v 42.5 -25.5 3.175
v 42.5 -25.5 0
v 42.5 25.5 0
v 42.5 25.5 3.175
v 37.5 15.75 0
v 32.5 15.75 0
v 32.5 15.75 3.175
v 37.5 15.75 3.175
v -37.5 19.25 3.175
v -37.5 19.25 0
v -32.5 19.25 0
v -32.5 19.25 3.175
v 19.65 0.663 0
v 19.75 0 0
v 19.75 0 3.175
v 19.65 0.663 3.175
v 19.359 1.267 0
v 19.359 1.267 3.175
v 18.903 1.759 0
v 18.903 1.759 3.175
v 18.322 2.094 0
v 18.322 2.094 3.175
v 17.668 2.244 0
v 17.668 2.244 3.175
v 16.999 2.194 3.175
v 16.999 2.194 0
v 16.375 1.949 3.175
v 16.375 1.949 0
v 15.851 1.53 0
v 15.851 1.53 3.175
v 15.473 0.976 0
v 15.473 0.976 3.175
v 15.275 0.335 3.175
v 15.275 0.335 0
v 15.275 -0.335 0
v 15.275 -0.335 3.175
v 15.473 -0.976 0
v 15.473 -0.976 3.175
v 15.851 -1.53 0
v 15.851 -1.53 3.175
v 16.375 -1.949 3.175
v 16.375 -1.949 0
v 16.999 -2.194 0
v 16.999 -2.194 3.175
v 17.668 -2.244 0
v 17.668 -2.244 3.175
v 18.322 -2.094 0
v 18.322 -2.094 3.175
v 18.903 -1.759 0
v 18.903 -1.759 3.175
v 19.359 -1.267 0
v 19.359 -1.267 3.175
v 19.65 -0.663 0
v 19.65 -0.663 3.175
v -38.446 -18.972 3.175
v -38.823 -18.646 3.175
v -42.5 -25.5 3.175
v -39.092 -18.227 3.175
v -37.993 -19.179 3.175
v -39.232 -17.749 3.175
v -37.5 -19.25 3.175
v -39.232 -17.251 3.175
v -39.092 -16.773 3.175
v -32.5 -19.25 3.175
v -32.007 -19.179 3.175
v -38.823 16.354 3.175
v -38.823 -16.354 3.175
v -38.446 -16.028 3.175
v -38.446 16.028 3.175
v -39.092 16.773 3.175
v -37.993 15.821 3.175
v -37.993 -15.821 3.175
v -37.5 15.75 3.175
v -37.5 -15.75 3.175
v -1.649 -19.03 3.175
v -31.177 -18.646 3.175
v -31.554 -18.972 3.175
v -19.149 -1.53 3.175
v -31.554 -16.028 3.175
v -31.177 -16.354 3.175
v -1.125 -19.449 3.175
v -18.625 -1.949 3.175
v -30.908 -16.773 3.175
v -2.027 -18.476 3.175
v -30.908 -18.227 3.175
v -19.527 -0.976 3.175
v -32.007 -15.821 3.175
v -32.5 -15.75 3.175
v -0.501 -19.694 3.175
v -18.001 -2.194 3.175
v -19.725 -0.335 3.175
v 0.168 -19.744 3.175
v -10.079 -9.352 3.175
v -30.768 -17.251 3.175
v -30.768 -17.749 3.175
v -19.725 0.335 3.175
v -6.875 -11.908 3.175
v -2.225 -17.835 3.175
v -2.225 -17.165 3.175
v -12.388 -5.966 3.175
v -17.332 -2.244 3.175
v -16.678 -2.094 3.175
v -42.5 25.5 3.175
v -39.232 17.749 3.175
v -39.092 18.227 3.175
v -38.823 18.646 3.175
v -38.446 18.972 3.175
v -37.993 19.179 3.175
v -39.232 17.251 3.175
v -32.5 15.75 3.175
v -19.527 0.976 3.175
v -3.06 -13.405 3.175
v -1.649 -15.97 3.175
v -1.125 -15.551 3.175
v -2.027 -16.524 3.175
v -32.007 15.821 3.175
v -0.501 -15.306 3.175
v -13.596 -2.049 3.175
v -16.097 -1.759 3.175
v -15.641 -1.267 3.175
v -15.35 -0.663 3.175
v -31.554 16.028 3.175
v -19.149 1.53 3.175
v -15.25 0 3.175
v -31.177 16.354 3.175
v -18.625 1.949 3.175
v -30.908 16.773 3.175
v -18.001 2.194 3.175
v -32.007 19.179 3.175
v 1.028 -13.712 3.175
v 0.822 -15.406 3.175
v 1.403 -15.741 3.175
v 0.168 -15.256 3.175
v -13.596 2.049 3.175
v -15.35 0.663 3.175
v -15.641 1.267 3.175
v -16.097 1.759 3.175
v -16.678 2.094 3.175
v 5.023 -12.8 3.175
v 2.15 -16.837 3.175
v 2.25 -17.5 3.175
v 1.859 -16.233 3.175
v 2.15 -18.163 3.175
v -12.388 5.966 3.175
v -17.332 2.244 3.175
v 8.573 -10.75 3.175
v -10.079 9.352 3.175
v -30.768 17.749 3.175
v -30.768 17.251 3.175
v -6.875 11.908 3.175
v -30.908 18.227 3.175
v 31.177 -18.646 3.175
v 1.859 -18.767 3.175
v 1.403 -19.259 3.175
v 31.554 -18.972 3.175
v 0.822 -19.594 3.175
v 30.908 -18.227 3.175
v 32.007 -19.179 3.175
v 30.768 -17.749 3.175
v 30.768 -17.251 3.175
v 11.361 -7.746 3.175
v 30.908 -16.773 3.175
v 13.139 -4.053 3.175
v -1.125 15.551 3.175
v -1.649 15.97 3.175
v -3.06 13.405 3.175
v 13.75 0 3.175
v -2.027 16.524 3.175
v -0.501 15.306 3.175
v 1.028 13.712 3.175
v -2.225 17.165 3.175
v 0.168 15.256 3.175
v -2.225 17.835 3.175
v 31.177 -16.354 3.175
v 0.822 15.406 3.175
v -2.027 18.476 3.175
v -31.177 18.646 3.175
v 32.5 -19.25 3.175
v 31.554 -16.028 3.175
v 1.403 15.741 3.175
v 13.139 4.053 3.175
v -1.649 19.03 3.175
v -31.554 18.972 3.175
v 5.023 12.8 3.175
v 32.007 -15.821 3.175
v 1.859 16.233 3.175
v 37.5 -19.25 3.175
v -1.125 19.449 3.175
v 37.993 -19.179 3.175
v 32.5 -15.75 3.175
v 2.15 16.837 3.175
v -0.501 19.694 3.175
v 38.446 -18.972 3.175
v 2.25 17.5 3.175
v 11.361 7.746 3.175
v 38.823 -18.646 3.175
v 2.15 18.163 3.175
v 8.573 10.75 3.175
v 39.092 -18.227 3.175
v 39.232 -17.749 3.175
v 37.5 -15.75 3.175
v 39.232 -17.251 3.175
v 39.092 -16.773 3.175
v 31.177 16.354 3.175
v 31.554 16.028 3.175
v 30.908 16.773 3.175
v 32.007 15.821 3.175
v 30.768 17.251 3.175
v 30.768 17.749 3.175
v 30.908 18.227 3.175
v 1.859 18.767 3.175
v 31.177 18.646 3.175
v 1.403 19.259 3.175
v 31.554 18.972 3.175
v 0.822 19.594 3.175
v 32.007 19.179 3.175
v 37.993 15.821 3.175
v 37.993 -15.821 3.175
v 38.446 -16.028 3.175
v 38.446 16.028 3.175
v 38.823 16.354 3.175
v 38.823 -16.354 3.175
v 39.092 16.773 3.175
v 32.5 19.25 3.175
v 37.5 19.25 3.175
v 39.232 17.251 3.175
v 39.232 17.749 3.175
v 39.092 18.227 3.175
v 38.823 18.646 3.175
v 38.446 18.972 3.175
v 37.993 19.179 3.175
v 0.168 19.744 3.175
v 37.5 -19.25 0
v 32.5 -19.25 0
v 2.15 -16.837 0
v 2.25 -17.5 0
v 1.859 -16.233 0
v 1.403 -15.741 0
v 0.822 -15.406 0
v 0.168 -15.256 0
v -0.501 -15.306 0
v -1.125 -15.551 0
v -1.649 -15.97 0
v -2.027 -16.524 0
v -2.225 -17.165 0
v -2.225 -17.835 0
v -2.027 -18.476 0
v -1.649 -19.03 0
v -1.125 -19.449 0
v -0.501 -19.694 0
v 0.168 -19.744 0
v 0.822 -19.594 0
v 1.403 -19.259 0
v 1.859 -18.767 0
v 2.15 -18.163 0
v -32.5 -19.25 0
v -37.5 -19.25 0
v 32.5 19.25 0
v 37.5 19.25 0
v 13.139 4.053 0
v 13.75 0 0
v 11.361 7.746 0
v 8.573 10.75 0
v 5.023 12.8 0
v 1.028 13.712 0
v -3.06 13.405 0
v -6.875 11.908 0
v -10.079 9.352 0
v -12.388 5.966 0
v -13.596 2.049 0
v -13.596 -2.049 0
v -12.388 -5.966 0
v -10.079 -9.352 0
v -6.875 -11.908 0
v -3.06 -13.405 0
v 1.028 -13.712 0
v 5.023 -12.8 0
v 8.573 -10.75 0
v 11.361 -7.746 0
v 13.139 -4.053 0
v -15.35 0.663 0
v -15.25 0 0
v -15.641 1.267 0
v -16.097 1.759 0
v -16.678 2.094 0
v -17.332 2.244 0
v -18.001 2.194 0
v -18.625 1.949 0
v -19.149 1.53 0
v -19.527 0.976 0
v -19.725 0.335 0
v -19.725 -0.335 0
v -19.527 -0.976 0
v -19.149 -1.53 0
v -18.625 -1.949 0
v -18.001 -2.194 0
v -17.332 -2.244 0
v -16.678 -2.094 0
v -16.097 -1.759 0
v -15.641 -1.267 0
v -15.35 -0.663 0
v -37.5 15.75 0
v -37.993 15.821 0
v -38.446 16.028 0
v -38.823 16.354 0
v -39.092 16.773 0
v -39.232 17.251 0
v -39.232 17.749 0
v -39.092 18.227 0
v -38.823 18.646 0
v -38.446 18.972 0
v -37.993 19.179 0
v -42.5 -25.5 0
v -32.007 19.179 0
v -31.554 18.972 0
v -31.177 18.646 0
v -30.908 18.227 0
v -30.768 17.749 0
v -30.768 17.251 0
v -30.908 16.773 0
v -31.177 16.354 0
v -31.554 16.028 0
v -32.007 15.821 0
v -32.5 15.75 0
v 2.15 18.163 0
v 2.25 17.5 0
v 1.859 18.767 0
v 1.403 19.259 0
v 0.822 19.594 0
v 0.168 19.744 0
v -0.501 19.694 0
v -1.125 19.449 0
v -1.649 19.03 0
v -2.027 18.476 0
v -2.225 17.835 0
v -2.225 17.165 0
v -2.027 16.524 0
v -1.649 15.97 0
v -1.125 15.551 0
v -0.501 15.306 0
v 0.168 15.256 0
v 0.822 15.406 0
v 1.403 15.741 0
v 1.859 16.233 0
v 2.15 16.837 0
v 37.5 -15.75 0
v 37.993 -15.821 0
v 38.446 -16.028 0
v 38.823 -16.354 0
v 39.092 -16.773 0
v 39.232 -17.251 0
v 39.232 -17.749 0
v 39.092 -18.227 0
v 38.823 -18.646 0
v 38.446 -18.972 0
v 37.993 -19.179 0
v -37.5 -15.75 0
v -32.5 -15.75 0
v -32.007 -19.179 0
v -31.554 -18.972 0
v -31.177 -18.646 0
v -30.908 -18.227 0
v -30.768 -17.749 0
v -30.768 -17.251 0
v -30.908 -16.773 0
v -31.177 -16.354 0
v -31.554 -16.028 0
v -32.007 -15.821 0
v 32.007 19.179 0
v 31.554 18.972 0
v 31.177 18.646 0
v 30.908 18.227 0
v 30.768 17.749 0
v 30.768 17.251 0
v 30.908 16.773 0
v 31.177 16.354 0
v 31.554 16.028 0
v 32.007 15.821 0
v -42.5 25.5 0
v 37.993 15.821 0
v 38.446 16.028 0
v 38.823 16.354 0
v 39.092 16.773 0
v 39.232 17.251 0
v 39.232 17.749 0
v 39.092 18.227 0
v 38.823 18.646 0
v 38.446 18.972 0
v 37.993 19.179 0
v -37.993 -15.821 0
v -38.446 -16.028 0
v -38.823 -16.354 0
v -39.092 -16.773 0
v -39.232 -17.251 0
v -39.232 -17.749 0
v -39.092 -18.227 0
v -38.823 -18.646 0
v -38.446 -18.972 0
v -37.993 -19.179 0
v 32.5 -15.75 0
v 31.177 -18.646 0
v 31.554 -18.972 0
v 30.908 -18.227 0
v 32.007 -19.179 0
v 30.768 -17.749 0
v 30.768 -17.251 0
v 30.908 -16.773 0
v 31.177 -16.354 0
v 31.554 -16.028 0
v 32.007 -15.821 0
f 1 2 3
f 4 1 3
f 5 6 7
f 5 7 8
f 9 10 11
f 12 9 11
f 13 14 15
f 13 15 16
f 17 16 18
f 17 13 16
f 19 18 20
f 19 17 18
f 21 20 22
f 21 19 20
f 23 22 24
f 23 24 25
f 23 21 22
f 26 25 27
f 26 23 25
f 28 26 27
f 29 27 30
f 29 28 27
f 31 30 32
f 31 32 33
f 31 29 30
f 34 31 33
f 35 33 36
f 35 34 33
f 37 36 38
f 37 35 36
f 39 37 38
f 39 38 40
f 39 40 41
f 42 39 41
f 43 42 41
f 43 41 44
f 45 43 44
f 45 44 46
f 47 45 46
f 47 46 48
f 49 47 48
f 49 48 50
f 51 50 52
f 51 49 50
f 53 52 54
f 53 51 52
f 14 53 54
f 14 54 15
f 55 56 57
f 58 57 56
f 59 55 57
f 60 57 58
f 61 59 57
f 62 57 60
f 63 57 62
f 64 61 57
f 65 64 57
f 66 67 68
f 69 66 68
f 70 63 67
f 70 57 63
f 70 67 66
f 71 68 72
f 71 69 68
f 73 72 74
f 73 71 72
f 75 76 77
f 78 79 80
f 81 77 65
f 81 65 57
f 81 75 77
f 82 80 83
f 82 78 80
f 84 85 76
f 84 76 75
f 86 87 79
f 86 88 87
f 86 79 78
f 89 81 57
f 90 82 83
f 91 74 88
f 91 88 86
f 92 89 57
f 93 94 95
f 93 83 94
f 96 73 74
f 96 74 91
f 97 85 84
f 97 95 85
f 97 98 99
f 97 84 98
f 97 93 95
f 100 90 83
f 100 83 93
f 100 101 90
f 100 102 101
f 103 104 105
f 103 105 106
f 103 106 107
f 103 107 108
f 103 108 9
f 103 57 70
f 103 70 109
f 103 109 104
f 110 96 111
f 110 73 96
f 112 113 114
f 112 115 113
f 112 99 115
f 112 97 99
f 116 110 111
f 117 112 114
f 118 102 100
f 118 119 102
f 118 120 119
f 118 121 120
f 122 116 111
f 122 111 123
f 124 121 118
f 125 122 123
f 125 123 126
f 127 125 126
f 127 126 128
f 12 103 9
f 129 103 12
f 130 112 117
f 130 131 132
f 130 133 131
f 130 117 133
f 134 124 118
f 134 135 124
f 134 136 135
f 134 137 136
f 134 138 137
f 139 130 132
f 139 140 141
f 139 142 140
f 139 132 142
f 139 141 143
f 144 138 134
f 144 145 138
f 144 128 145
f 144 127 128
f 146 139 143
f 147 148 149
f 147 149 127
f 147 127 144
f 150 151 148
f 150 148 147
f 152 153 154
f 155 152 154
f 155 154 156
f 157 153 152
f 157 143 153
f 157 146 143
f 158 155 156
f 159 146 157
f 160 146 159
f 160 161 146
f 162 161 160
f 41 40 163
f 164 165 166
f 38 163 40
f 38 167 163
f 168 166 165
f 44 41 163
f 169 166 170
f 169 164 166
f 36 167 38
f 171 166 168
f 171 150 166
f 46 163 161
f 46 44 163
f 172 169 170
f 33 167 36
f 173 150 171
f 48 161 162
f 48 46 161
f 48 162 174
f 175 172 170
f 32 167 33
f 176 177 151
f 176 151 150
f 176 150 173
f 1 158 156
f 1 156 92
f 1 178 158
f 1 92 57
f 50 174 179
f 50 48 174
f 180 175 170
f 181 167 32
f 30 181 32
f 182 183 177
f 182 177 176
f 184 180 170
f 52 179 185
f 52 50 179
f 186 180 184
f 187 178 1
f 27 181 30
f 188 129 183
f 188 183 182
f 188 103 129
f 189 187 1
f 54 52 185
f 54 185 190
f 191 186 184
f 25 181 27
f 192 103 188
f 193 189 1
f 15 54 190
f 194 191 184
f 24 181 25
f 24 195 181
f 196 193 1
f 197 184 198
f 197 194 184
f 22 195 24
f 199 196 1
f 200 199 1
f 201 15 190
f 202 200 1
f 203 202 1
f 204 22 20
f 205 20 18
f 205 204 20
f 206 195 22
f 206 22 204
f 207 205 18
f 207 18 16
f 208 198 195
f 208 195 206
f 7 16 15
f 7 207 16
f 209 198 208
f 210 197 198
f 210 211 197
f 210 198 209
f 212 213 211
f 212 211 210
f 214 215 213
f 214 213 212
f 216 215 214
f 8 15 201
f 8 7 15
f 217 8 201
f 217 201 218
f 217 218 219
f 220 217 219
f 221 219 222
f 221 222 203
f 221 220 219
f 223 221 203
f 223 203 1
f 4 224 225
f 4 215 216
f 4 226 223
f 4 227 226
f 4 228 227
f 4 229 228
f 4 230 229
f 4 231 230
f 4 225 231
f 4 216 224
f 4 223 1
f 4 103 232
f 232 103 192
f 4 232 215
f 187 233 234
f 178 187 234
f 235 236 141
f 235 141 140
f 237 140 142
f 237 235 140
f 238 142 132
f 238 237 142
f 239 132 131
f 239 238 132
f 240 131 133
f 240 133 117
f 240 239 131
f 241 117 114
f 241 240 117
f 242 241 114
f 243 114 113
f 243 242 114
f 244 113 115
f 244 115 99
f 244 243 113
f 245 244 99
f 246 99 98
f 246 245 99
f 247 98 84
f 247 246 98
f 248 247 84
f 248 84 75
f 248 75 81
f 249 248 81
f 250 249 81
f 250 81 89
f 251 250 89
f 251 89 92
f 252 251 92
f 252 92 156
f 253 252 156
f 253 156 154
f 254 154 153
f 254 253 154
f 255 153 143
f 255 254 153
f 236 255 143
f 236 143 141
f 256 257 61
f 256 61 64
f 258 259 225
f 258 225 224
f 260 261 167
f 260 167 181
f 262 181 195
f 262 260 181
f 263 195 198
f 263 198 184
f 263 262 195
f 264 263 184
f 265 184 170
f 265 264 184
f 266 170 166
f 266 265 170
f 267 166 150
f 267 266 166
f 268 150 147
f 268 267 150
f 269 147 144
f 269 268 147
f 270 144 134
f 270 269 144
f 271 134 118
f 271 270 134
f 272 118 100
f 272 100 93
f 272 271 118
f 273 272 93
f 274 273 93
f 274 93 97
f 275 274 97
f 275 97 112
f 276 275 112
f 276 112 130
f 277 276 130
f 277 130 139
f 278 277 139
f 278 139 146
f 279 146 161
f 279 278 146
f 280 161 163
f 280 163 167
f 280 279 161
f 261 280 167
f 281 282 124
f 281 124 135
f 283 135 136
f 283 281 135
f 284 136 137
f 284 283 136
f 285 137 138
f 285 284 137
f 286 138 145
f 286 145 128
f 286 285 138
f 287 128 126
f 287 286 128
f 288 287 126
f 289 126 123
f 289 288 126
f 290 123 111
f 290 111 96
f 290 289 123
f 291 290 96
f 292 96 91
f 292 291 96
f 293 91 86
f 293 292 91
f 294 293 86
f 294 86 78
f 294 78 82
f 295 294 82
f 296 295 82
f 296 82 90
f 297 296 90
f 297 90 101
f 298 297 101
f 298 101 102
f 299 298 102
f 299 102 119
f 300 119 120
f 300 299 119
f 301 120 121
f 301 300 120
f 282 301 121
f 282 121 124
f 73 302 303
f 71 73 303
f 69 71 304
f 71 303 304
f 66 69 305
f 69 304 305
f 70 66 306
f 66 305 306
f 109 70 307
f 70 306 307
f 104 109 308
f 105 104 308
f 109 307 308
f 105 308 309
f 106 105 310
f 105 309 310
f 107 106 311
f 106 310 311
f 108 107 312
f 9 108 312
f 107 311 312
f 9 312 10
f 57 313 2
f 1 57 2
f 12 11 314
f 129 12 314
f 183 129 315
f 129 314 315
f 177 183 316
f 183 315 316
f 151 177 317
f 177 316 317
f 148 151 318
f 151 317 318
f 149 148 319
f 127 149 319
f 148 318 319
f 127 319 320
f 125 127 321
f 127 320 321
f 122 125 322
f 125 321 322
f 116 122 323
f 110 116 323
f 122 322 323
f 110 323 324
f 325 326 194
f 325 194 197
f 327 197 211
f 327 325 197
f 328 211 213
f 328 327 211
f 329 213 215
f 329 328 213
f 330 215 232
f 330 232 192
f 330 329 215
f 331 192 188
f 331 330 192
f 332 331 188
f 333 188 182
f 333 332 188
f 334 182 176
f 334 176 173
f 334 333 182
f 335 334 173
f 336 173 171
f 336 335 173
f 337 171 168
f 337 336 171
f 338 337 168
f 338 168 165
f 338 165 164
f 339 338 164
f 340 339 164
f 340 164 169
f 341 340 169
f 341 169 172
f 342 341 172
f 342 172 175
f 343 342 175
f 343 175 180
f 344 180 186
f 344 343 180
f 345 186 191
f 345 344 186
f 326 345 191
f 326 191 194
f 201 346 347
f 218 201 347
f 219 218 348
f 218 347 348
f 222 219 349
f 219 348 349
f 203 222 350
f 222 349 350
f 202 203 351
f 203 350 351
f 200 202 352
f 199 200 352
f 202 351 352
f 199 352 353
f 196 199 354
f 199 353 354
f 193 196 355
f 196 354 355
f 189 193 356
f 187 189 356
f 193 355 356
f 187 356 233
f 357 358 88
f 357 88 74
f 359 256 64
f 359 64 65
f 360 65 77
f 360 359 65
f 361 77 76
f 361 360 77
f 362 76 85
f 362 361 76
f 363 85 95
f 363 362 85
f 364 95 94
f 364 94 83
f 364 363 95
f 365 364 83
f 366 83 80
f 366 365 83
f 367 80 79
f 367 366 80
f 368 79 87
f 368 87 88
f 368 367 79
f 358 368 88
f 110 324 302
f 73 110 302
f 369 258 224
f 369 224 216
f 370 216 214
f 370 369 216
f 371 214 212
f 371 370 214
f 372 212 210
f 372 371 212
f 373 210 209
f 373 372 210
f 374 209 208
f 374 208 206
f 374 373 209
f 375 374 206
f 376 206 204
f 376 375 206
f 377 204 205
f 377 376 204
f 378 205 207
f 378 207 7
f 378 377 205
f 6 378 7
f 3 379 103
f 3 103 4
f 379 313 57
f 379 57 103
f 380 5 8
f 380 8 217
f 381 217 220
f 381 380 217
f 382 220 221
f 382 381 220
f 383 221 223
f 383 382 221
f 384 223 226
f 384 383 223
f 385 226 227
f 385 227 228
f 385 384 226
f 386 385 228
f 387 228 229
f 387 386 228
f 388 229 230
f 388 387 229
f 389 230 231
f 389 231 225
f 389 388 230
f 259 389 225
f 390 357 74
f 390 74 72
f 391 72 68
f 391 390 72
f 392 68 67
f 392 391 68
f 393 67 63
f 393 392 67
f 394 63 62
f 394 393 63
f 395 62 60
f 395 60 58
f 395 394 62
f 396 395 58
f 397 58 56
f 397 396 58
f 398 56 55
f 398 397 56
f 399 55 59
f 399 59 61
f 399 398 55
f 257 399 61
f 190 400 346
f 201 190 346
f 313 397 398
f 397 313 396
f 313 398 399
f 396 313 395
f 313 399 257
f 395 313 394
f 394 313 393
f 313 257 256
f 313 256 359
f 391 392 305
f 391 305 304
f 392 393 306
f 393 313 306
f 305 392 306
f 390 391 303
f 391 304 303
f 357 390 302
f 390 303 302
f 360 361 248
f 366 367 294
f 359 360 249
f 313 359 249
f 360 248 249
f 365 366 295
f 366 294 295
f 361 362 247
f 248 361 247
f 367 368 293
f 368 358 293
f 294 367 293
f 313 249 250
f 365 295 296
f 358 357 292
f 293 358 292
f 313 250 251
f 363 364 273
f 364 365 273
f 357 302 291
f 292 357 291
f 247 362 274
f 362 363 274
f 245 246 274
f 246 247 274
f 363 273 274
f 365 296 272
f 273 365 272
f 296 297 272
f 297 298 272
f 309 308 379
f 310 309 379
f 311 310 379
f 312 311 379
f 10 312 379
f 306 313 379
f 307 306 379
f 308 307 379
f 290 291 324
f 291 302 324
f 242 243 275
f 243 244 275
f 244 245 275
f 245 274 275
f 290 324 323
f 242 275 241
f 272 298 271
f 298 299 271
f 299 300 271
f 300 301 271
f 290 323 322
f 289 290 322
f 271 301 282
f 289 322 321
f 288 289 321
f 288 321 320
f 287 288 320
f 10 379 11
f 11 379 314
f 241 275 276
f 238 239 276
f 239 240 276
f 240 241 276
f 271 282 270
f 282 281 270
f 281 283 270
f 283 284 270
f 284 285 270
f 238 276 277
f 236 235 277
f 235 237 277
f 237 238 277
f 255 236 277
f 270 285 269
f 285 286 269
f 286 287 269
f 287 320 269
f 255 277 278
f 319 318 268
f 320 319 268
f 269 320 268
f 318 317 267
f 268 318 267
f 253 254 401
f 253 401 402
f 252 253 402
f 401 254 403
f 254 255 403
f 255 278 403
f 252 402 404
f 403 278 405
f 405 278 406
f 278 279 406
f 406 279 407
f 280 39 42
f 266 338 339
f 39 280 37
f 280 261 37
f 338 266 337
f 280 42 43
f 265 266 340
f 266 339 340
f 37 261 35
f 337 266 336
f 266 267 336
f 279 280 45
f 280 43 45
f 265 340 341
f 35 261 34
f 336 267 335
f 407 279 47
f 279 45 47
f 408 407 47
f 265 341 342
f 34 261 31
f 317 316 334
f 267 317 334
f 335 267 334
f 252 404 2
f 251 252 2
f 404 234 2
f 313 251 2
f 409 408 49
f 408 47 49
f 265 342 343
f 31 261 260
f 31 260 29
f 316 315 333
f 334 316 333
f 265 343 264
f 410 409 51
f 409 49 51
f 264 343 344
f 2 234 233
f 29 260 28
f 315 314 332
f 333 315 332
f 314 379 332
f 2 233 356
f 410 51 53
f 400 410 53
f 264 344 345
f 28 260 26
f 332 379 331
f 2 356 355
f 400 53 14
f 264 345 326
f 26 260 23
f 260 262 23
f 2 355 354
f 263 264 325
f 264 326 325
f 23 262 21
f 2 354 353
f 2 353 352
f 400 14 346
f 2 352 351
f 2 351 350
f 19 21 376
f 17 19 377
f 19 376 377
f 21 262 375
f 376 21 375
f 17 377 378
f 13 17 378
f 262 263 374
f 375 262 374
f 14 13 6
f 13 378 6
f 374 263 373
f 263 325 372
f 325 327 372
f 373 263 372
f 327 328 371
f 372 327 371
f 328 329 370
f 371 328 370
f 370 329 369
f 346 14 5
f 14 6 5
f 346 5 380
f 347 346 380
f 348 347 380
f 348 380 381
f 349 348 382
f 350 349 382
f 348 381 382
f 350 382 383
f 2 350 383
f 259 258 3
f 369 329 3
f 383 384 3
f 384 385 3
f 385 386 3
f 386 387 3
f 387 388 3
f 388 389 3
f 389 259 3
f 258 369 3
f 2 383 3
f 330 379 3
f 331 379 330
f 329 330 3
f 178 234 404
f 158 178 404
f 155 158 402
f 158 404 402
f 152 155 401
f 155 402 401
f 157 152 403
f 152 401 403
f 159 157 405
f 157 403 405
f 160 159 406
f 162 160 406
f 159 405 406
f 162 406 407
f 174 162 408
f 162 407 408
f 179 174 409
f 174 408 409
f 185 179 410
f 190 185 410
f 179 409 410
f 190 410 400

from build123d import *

# Parameters (mm, degrees)
SKETCH1_W           = 85
SKETCH1_H           = 51
SKETCH1_R           = 13.75
SKETCH1_R_2         = 2.25
BOSS_EXTRUDE1_DEPTH = 3.175


with BuildPart() as part:
    # Sketch1 → Boss-Extrude1 (new body)
    with BuildSketch(Plane.XY):
        Rectangle(SKETCH1_W, SKETCH1_H)
        Circle(SKETCH1_R, mode=Mode.SUBTRACT)
        with Locations((0, 17.5)):
            Circle(SKETCH1_R_2, mode=Mode.SUBTRACT)
        with Locations((17.5, 0)):
            Circle(SKETCH1_R_2, mode=Mode.SUBTRACT)
        with Locations((0, -17.5)):
            Circle(SKETCH1_R_2, mode=Mode.SUBTRACT)
        with Locations((-17.5, 0)):
            Circle(SKETCH1_R_2, mode=Mode.SUBTRACT)
        with BuildLine():
            Line((-37.5, 19.25), (-32.5, 19.25))
            ThreePointArc((-32.5, 19.25), (-30.75, 17.5), (-32.5, 15.75))
            Line((-32.5, 15.75), (-37.5, 15.75))
            ThreePointArc((-37.5, 15.75), (-39.25, 17.5), (-37.5, 19.25))
        make_face(mode=Mode.SUBTRACT)
        with BuildLine():
            Line((37.5, 19.25), (32.5, 19.25))
            ThreePointArc((32.5, 19.25), (30.75, 17.5), (32.5, 15.75))
            Line((32.5, 15.75), (37.5, 15.75))
            ThreePointArc((37.5, 15.75), (39.25, 17.5), (37.5, 19.25))
        make_face(mode=Mode.SUBTRACT)
        with BuildLine():
            Line((37.5, -19.25), (32.5, -19.25))
            ThreePointArc((32.5, -19.25), (30.75, -17.5), (32.5, -15.75))
            Line((32.5, -15.75), (37.5, -15.75))
            ThreePointArc((37.5, -15.75), (39.25, -17.5), (37.5, -19.25))
        make_face(mode=Mode.SUBTRACT)
        with BuildLine():
            Line((-37.5, -19.25), (-32.5, -19.25))
            ThreePointArc((-32.5, -19.25), (-30.75, -17.5), (-32.5, -15.75))
            Line((-32.5, -15.75), (-37.5, -15.75))
            ThreePointArc((-37.5, -15.75), (-39.25, -17.5), (-37.5, -19.25))
        make_face(mode=Mode.SUBTRACT)
    extrude(amount=BOSS_EXTRUDE1_DEPTH)


solid = part.part
